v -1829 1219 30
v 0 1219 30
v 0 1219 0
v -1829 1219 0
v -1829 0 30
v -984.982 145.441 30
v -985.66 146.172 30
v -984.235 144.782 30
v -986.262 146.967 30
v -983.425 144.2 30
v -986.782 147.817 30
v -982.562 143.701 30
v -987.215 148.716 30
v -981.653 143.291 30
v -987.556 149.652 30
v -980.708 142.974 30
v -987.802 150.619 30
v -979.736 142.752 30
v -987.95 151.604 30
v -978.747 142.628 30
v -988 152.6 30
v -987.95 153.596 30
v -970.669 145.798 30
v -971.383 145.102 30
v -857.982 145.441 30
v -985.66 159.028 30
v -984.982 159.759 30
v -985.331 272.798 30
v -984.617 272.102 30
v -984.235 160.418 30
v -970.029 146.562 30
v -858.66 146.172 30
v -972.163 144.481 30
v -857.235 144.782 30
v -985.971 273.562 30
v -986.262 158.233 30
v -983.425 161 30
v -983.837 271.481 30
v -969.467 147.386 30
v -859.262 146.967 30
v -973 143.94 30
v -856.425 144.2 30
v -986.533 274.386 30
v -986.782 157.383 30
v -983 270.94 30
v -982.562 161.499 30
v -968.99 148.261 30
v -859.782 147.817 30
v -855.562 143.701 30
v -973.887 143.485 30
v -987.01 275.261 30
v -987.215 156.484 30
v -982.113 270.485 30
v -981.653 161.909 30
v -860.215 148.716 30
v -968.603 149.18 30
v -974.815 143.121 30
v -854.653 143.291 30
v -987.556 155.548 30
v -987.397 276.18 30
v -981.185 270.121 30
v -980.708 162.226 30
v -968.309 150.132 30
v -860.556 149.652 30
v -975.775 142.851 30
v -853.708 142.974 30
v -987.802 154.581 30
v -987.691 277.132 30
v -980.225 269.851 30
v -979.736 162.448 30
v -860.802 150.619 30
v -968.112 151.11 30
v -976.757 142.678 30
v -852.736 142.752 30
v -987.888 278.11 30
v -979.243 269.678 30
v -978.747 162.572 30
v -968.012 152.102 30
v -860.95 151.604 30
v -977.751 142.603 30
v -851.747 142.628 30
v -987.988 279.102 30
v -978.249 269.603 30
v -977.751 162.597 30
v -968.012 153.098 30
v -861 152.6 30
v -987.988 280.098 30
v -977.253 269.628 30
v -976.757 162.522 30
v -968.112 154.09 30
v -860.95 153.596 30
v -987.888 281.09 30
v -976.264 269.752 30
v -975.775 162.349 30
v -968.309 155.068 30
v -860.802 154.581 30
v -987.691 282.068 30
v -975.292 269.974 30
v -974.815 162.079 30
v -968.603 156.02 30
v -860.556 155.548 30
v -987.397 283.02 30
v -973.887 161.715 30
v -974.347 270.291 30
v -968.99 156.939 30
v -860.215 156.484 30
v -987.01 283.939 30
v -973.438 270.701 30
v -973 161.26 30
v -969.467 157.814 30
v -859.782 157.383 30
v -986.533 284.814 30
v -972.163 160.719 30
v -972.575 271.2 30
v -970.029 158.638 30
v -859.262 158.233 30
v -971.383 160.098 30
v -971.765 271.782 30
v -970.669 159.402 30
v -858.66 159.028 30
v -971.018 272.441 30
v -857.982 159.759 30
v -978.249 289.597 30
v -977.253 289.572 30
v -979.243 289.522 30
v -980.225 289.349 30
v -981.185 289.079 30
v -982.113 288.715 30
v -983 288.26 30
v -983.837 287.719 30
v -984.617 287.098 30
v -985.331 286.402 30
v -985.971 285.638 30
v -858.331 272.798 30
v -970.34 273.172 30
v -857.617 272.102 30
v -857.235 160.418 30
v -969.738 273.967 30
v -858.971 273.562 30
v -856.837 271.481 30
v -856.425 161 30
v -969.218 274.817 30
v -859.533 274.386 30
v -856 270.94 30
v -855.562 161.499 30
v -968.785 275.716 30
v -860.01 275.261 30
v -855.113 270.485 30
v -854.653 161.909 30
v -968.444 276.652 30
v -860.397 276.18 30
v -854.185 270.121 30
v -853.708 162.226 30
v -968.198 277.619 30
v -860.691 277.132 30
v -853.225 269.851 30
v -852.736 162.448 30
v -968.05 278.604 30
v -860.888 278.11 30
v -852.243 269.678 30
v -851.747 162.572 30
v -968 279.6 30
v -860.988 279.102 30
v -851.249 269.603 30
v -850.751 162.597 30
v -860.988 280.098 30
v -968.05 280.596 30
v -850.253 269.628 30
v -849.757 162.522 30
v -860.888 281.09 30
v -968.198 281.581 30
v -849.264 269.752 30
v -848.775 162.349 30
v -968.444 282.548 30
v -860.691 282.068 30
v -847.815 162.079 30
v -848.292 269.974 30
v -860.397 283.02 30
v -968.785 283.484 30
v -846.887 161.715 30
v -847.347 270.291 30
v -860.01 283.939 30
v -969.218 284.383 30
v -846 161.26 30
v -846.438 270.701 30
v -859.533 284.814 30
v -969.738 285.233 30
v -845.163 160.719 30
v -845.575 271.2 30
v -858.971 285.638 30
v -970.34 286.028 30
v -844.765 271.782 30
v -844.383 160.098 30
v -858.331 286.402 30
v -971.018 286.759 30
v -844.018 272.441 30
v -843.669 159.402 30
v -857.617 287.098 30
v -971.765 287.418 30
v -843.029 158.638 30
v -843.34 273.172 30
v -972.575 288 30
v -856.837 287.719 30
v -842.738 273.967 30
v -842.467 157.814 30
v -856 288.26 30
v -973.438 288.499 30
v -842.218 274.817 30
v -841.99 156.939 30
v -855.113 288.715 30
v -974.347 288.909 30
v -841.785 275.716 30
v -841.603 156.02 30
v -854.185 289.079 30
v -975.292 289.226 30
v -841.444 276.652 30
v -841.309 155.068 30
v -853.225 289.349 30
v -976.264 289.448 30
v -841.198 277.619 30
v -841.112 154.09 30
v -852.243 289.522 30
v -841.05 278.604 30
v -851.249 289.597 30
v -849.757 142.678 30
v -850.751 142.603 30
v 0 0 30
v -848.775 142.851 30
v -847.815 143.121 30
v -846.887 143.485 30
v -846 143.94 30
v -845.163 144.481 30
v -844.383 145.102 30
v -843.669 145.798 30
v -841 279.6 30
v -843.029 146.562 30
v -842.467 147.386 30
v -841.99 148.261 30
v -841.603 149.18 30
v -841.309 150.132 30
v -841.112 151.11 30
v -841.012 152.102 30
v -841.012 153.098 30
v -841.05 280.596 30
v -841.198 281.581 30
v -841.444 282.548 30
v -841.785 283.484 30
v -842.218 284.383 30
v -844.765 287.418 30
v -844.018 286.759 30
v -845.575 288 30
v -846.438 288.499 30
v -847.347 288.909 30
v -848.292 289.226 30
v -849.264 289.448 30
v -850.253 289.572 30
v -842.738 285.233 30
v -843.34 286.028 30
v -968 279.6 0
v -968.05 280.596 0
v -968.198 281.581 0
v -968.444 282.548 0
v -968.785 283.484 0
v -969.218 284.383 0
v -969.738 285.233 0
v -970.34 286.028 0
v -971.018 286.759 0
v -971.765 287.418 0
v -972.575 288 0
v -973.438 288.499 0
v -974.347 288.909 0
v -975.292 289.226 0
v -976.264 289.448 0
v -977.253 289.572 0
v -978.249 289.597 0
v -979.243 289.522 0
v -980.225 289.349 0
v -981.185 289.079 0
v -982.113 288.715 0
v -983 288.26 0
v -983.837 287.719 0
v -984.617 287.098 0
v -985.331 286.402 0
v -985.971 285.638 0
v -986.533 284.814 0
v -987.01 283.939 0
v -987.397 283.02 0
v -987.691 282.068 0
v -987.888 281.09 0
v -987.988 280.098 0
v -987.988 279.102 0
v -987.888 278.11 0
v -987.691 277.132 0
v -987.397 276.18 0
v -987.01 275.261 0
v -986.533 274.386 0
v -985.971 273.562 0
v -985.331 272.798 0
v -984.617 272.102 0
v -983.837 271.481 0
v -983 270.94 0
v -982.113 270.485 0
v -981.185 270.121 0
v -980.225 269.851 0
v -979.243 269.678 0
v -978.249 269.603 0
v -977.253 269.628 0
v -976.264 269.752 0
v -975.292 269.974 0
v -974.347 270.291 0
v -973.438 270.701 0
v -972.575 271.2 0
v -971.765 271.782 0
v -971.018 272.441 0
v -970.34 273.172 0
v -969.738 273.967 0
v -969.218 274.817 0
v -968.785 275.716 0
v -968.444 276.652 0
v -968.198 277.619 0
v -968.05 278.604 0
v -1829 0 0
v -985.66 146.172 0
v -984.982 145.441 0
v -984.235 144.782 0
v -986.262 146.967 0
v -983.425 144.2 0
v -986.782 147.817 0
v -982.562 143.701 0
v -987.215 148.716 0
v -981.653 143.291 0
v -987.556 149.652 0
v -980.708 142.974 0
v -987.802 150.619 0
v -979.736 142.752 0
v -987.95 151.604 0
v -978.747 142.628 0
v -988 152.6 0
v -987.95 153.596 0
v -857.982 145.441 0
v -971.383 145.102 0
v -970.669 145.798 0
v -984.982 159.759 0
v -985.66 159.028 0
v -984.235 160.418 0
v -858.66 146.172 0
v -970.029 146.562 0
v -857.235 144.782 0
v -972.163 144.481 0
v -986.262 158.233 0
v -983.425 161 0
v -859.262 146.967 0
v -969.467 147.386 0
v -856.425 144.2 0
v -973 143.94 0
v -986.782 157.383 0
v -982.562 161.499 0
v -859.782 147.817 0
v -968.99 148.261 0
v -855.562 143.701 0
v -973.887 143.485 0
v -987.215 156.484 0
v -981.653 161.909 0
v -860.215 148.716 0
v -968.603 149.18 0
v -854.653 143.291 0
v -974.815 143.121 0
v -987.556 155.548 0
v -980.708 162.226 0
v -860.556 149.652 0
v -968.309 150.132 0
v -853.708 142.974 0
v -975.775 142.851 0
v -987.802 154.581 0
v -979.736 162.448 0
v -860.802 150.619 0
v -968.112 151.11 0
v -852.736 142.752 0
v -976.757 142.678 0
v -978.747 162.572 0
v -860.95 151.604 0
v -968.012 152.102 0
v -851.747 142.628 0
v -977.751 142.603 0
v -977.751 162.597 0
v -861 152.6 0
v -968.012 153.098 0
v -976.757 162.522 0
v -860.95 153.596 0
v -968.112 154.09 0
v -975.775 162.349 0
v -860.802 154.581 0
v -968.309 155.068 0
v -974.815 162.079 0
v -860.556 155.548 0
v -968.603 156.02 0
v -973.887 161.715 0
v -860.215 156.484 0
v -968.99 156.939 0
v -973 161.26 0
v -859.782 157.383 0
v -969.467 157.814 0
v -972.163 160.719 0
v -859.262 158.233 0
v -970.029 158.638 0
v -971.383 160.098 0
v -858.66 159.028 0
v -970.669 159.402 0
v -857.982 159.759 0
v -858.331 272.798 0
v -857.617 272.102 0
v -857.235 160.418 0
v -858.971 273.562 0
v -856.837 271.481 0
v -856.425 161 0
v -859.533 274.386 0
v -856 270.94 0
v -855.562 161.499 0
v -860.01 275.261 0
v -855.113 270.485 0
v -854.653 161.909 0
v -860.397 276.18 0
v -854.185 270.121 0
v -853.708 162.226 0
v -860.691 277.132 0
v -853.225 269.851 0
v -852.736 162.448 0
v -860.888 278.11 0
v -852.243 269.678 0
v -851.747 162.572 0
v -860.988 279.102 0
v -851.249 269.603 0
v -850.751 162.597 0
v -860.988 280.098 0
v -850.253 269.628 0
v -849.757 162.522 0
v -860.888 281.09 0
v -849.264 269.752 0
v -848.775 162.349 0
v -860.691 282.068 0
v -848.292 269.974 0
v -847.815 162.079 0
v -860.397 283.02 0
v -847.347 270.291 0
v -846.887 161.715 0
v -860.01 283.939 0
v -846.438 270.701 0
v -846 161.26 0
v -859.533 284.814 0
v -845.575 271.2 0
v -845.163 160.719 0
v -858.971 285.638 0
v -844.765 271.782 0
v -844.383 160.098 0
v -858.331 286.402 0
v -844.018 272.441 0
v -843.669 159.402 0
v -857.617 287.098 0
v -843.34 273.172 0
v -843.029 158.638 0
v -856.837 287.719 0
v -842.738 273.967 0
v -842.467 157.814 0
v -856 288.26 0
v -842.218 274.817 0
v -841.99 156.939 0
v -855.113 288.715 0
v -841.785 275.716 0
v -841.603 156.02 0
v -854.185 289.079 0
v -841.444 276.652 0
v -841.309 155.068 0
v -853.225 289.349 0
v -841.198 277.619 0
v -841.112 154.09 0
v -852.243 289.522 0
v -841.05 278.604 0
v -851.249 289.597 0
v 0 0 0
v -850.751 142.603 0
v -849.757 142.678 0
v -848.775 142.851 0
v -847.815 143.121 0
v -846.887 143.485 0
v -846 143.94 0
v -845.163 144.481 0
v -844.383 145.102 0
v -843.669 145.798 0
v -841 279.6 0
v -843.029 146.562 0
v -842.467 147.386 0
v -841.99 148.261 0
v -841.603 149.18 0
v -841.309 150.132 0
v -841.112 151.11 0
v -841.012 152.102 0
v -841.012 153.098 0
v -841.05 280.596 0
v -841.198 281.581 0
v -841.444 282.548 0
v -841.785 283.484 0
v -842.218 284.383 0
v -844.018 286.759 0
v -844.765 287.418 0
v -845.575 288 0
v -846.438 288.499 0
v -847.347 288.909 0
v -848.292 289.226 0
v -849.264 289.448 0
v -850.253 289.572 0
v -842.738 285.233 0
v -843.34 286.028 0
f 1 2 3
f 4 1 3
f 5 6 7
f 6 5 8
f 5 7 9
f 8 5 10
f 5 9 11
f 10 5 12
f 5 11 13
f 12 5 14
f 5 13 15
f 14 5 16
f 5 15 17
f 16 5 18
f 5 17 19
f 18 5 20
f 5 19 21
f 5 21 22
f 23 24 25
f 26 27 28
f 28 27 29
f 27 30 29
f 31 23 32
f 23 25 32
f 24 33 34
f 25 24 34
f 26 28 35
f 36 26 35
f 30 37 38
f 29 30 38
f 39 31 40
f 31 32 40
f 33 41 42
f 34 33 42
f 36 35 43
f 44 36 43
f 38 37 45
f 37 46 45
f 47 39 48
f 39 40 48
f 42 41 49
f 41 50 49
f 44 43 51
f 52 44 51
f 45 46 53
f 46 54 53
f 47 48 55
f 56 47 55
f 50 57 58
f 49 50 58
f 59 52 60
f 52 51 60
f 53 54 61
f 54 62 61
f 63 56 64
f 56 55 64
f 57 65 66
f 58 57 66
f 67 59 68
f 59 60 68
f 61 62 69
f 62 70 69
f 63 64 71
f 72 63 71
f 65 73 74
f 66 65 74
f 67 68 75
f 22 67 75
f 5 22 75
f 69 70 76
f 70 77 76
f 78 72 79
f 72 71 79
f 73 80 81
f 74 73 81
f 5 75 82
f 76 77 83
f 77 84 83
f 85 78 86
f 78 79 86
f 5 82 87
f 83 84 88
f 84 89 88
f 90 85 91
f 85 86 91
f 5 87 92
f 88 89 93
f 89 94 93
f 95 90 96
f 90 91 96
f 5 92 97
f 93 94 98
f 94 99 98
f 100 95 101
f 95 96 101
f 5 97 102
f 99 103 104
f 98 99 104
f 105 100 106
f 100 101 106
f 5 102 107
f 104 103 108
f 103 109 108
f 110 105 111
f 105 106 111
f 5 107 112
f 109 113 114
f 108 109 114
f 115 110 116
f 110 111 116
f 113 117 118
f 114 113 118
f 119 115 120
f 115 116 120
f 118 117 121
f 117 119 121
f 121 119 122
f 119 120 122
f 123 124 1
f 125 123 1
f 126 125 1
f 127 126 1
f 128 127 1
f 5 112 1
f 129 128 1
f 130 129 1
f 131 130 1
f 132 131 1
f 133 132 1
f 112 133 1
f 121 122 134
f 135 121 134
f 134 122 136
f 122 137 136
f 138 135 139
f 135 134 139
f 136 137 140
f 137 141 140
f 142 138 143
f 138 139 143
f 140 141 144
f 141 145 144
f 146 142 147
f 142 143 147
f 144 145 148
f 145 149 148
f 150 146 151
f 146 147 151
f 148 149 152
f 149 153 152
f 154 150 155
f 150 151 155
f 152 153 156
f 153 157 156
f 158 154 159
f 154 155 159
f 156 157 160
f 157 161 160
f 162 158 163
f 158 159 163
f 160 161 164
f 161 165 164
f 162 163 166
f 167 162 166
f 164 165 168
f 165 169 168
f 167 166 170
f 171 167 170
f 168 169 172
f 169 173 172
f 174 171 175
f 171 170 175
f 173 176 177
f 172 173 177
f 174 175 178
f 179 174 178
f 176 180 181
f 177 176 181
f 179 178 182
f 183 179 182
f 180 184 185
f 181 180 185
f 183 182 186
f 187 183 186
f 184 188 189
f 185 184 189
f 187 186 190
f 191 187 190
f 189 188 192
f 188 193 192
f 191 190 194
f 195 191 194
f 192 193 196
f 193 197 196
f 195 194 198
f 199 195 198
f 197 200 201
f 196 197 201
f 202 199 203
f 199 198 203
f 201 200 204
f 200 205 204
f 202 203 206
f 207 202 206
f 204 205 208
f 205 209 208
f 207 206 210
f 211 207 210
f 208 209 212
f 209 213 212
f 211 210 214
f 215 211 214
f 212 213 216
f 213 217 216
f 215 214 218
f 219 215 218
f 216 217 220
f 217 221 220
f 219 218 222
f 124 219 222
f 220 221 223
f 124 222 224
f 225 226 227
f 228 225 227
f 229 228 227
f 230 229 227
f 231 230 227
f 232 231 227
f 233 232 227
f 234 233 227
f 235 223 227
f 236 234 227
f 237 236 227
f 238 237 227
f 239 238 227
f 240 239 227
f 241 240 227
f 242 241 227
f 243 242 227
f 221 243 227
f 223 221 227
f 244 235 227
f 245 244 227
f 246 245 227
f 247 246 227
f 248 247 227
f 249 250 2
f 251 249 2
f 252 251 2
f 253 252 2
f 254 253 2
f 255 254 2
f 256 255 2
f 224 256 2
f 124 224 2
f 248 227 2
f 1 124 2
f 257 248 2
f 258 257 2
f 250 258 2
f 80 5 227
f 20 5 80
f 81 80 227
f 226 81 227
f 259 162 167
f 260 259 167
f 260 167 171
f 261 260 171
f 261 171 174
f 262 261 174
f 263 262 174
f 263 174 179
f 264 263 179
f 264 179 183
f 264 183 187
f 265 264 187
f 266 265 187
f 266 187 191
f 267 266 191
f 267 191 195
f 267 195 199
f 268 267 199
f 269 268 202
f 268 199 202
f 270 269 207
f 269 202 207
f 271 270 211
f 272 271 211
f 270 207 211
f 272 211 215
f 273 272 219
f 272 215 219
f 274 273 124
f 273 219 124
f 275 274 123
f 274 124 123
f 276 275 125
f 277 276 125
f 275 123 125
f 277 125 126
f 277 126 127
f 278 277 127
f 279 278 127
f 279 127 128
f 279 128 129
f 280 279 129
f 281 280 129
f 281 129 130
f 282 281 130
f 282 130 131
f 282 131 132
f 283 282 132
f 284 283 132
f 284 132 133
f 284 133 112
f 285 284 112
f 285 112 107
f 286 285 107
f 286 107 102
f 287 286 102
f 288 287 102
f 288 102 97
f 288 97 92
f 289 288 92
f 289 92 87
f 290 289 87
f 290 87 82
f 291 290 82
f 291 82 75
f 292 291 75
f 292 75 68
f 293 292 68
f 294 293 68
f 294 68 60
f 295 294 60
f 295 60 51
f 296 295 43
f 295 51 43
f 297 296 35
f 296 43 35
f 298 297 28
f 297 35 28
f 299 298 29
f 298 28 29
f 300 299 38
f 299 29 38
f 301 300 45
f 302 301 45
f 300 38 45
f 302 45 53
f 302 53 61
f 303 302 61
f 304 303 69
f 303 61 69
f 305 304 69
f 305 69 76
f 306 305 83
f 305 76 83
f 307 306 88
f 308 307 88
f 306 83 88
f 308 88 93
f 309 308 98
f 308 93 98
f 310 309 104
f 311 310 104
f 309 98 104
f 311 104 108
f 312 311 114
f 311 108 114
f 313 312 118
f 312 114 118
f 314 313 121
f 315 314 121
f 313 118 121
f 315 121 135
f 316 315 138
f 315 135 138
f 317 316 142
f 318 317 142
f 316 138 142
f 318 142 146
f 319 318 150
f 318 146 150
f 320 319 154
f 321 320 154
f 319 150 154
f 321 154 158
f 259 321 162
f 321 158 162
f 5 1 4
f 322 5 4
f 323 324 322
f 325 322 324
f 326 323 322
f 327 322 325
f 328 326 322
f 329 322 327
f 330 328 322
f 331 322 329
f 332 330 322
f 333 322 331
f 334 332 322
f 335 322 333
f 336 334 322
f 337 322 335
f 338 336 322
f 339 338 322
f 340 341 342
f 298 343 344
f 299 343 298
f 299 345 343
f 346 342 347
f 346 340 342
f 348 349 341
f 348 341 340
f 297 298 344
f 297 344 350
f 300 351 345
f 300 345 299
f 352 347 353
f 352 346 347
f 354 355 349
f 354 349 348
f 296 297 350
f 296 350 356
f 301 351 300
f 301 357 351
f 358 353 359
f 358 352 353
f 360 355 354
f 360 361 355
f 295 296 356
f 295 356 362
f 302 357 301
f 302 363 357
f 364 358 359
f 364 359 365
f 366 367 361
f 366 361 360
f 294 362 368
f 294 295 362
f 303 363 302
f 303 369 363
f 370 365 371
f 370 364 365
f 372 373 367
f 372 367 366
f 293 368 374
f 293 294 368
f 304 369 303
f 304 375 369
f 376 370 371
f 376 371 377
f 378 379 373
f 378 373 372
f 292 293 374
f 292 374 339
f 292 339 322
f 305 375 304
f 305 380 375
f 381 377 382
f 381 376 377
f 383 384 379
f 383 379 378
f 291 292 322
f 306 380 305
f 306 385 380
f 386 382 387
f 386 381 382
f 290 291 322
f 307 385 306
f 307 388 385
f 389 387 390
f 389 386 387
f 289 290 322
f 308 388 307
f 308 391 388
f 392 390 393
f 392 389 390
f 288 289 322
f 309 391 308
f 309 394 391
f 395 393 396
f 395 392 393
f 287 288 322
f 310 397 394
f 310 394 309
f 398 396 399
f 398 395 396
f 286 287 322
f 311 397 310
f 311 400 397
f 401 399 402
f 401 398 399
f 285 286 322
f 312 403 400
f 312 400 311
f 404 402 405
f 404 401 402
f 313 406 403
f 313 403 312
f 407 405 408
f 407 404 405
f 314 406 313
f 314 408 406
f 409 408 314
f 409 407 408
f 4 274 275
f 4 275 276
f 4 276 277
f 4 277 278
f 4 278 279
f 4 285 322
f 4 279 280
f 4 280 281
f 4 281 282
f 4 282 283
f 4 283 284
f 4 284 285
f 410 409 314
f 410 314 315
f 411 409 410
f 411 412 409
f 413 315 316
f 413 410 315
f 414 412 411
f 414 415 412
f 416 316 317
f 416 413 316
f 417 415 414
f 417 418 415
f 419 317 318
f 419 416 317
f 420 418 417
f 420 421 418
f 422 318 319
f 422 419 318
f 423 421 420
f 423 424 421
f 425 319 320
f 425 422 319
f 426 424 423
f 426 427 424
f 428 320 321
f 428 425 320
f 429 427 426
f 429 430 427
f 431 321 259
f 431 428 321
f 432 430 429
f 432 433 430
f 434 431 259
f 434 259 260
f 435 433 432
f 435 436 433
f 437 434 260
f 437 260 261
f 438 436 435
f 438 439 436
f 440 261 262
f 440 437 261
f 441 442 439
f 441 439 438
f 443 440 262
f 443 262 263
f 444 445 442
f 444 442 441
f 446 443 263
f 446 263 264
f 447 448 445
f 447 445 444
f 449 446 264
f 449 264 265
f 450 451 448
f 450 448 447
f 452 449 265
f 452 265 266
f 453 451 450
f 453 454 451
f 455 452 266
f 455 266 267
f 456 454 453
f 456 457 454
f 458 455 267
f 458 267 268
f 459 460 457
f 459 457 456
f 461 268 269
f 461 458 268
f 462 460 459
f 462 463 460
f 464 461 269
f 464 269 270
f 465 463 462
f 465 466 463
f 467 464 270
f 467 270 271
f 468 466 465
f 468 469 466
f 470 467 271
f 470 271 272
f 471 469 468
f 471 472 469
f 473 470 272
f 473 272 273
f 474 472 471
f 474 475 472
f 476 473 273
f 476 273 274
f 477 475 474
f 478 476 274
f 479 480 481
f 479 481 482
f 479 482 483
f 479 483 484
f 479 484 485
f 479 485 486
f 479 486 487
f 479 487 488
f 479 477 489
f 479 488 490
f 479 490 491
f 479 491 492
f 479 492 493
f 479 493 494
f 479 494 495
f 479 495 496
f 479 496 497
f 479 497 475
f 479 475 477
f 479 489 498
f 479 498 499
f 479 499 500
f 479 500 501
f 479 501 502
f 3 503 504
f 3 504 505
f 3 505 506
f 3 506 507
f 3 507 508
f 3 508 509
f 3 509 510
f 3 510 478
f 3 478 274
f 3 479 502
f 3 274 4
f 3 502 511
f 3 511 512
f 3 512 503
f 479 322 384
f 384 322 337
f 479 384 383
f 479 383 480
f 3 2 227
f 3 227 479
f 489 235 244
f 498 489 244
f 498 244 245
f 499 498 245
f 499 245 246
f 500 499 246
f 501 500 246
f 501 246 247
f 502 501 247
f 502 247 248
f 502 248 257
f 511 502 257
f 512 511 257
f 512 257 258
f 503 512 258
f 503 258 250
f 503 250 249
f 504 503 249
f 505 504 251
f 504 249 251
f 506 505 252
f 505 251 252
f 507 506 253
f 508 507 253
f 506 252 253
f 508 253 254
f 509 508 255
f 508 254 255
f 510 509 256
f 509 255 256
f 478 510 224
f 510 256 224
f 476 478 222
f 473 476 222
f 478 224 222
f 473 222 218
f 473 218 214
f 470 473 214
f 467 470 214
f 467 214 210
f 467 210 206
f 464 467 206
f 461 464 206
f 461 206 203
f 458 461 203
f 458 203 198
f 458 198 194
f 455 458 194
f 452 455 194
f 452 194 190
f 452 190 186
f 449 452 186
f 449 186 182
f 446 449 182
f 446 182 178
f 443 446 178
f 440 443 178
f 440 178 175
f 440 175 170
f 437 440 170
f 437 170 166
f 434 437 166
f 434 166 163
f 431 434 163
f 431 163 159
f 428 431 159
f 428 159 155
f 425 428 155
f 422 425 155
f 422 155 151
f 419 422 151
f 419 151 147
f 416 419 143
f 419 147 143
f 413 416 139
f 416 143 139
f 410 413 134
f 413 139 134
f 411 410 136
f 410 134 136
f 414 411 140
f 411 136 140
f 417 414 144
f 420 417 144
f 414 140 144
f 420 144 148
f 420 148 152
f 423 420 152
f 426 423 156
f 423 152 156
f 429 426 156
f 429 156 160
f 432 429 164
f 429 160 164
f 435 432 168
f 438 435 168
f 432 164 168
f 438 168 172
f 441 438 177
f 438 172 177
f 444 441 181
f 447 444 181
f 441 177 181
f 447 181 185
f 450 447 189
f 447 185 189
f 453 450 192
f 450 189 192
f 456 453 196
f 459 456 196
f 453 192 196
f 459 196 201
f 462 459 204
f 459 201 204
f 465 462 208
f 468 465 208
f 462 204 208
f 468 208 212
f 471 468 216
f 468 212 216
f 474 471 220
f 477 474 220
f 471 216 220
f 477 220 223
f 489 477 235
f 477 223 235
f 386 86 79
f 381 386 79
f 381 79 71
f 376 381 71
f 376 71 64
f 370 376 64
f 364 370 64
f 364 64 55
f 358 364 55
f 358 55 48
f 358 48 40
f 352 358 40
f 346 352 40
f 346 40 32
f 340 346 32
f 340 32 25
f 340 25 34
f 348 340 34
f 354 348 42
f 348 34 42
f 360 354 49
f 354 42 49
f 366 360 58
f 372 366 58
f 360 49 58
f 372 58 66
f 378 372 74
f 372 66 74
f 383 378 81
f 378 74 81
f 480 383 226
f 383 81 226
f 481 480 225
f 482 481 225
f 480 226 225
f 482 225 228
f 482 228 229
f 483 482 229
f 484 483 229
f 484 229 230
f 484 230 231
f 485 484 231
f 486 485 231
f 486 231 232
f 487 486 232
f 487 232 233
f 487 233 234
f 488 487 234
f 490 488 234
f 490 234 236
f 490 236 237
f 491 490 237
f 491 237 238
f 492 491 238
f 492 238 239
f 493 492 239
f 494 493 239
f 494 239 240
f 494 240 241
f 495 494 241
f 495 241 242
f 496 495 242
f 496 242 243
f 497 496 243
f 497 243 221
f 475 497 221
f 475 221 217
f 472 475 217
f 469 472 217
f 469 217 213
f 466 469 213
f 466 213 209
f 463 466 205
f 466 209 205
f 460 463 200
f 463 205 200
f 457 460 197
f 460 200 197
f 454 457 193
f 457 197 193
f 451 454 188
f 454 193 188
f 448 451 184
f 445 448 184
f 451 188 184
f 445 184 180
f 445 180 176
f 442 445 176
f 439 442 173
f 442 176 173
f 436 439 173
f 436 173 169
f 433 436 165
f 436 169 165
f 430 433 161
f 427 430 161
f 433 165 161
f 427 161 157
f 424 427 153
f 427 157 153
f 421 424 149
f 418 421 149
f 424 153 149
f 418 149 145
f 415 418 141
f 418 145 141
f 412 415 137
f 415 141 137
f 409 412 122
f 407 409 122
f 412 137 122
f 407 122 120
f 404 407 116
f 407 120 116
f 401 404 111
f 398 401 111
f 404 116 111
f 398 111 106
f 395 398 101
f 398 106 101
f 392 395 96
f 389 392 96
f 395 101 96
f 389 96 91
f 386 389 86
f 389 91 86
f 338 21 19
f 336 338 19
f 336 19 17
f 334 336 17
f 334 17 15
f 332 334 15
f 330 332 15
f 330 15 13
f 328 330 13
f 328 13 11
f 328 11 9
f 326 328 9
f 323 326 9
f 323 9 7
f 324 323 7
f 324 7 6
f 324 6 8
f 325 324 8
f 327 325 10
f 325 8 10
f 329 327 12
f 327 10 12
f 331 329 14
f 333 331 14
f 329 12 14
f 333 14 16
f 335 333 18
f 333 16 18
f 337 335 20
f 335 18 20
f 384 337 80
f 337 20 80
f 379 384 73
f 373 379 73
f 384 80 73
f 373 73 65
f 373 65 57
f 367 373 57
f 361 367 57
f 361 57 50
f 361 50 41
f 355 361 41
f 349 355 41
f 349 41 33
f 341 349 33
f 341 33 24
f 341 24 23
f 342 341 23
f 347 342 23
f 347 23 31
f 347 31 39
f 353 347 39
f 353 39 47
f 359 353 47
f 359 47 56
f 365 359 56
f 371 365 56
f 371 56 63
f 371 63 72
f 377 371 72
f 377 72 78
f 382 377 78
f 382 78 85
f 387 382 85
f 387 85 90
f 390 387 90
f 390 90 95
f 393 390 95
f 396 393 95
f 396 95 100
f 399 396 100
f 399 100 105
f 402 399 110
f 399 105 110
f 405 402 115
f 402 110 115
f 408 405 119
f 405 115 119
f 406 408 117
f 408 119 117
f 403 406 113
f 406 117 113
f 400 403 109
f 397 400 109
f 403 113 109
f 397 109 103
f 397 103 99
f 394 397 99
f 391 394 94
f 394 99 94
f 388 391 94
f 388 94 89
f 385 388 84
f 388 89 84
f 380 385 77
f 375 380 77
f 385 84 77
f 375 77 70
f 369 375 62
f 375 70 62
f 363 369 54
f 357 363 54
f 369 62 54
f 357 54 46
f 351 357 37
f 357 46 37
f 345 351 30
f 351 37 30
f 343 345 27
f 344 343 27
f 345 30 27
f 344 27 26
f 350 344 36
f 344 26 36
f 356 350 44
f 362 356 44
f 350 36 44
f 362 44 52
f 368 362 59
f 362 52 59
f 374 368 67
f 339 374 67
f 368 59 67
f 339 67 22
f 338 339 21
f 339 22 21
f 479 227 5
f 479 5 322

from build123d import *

# Parameters (mm, degrees)
SKETCH1_W           = 30
SKETCH1_H           = 1219
BOSS_EXTRUDE5_DEPTH = 1829
SKETCH6_R           = 10
CUT_EXTRUDE1_DEPTH  = 2199.204267124


with BuildPart() as part:
    # Sketch1 → Boss-Extrude5 (new body)
    with BuildSketch(Plane(origin=(0, 0, 0), x_dir=(0, 0, -1), z_dir=(1, 0, 0))):
        with Locations((-15, 609.5)):
            Rectangle(SKETCH1_W, SKETCH1_H)
    extrude(amount=-BOSS_EXTRUDE5_DEPTH)

    # Sketch6 → Cut-Extrude1 (cut, through all)
    with BuildSketch(Plane.XY.offset(30)):
        with Locations((-978, 279.6)):
            Circle(SKETCH6_R)
        with Locations((-851, 279.6)):
            Circle(SKETCH6_R)
        with Locations(Location((-851, 152.6, 0), (0, 0, 180))):
            Circle(SKETCH6_R)
        with Locations(Location((-978, 152.6, 0), (0, 0, 180))):
            Circle(SKETCH6_R)
    extrude(amount=-CUT_EXTRUDE1_DEPTH, mode=Mode.SUBTRACT)


solid = part.part
